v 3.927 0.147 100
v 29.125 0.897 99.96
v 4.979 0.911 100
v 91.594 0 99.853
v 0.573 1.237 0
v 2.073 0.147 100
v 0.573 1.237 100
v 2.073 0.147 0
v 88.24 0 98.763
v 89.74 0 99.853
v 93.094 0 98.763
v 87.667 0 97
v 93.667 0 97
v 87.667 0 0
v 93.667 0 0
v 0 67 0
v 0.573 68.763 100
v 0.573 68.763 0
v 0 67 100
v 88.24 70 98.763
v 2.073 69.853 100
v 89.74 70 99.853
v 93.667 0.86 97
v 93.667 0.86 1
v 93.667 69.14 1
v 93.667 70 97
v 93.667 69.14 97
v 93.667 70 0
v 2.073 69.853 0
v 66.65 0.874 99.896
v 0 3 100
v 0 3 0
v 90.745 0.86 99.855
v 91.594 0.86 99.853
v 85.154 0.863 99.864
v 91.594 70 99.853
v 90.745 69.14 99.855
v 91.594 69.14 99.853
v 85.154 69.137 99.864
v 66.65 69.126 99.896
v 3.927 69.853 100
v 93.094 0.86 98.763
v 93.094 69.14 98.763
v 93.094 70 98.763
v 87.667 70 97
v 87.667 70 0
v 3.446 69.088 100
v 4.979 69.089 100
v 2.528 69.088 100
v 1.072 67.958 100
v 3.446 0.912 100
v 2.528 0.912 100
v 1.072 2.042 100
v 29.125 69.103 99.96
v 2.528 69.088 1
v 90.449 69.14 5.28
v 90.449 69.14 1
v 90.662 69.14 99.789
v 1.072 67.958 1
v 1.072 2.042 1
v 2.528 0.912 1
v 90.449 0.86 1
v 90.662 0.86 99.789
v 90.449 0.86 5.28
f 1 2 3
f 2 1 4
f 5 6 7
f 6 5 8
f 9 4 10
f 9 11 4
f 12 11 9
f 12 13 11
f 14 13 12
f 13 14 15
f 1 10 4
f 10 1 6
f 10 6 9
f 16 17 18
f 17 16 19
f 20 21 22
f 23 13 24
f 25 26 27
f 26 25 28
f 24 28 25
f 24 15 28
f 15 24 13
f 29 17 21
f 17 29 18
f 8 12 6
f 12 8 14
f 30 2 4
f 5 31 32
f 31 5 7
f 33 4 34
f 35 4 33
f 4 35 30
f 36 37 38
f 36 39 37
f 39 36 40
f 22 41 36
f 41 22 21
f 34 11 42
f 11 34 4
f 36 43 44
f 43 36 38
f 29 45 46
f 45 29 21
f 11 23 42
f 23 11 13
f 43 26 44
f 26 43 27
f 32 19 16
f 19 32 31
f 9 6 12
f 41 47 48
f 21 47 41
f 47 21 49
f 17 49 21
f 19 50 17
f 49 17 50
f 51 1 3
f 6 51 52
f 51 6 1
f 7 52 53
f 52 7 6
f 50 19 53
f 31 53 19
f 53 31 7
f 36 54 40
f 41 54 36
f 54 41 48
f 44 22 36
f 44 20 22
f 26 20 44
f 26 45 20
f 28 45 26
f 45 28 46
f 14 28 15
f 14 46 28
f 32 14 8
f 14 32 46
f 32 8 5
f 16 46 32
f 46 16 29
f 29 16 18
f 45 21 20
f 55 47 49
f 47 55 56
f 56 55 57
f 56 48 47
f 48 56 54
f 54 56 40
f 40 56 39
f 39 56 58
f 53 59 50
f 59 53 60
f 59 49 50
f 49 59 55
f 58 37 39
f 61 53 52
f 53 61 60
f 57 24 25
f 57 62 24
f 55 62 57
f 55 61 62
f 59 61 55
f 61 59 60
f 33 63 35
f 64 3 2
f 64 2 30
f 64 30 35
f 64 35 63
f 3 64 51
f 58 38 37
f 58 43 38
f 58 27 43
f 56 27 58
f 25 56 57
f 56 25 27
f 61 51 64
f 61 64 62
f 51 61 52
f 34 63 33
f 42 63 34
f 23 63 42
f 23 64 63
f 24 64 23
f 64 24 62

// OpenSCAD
// file: ../lib/cubes.scad
include<defaults.scad>;

/**
 * Stackable cube (full, no hole).
 *
 * Args:
 *     size: [depth, width, height] vector. These are total dimensions, including the pedestal.
 *     stack_size: [depth, width, height] vector. These are dimensions of the pedestal itself.
 */
module StackableCube(size, stack_size) {
    translate([ 0, 0, stack_size[2] ]) {
        hull() {
            cube([ size[0], size[1], size[2] - stack_size[2] ]);
            translate(
                [ (size[0] - stack_size[0]) / 2, (size[1] - stack_size[1]) / 2, -(size[0] - stack_size[0]) / 1.25 ]
            ) cube(stack_size);
        }
        translate([ (size[0] - stack_size[0]) / 2, (size[1] - stack_size[1]) / 2, -stack_size[2] ]) cube(stack_size);
    }
}

/**
 * Simple full cube with rounded vertical edges.
 *
 * Args:
 *     size: [depth, width, height] vector.
 *     radius: Vertical edge radius.
 */
module RoundCube(size, radius = RADIUS) {
    depth = size[0];
    width = size[1];
    height = size[2];
    hull() {
        translate([ radius, radius, 0 ]) cylinder(height, r = radius);
        translate([ depth - radius, radius, 0 ]) cylinder(height, r = radius);
        translate([ radius, width - radius, 0 ]) cylinder(height, r = radius);
        translate([ depth - radius, width - radius, 0 ]) cylinder(height, r = radius);
    }
}

/**
 * Stackable full cube with rounded vertical edges.
 *
 * Args:
 *     size: [depth, width, height] vector. These are total dimensions, including the pedestal.
 *     stack_size: [depth, width, height] vector. These are dimensions of the pedestal itself.
 *     radius: Vertical edge outer radius.
 */
module StackableRoundCube(size, stack_size, radius = RADIUS) {
    stack_radius = radius - (size[0] - stack_size[0]) / 2;

    translate([ 0, 0, stack_size[2] ]) {
        hull() {
            RoundCube([ size[0], size[1], size[2] - stack_size[2] ], radius = radius);

            translate(
                [ (size[0] - stack_size[0]) / 2, (size[1] - stack_size[1]) / 2, -(size[0] - stack_size[0]) / 1.25 ]
            ) RoundCube(stack_size, radius = stack_radius);
        }
        translate([ (size[0] - stack_size[0]) / 2, (size[1] - stack_size[1]) / 2, -stack_size[2] ])
            RoundCube(stack_size, radius = stack_radius);
    }
}
// file: ../lib/dividers.scad
include<defaults.scad>;

/**
 * Vertical dividers.
 *
 * Args:
 *     size: [depth, width, height] vector of outer box size.
 *     dividers: [[x1, x2, ...], [y1, y2, ...]] for x, resp. y dividers.
 *     wall_width: Width of the dividers.
 */
module Dividers(size, dividers, wall_width = WALL_WIDTH) {
    depth = size[0];
    width = size[1];
    height = size[2];

    for (div = dividers[0]) {
        translate([ 0, div - wall_width / 2, 0 ]) cube([ depth, wall_width, height ]);
    }
    for (div = dividers[1]) {
        translate([ div - wall_width / 2, 0, 0 ]) cube([ wall_width, width, height ]);
    }
}

/**
 * Rounded vertical dividers.
 *
 * Args:
 *     size: [depth, width, height] vector of outer box size.
 *     dividers: [[x1, x2, ...], [y1, y2, ...]] for x, resp. y dividers.
 *     wall_width: Width of the dividers.
 *     radius: Radius of upper corners.
 */
module RoundDividers(size, dividers, wall_width = WALL_WIDTH, radius = RADIUS) {
    depth = size[0];
    width = size[1];
    height = size[2];

    intersection() {
        Dividers(size, dividers, wall_width = wall_width, radius = radius);

        hull() {
            translate([ radius, radius, height - radius ]) sphere(radius);
            translate([ radius, width - radius, height - radius ]) sphere(radius);
            translate([ depth - radius, width - radius, height - radius ]) sphere(radius);
            translate([ depth - radius, radius, height - radius ]) sphere(radius);

            translate([ radius, radius, 0 ]) cylinder(1, r = radius);
            translate([ radius, width - radius, 0 ]) cylinder(1, r = radius);
            translate([ depth - radius, width - radius, 0 ]) cylinder(1, r = radius);
            translate([ depth - radius, radius, 0 ]) cylinder(1, r = radius);
        }
    }
}
// file: ../lib/boxes.scad
include<cubes.scad>;
include<defaults.scad>;
include<dividers.scad>;

/**
 * Simple square box with open top.
 *
 * Args:
 *     size: [depth, width, height] vector.
 *     wall_width: Width of the vertical walls.
 *     bottom_height: Bottom thickness.
 */
module SquareBox(size, wall_width = WALL_WIDTH, bottom_height = BOTTOM_HEIGHT) {
    depth = size[0];
    width = size[1];
    height = size[2];
    difference() {
        cube(size);
        translate([ wall_width, wall_width, bottom_height ])
            cube([ depth - 2 * wall_width, width - 2 * wall_width, height ]);
    }
}

/**
 * Stackable square box. Bottom is narrowed to fit in another box with same dimensions (stackable or not).
 *
 * Args:
 *     size: [depth, width, height] vector. These are total dimensions, including the pedestal.
 *     wall_width: Width of the vertical walls.
 *     bottom_height: Bottom thickness.
 *     stack_height: Height of the pedestal.
 *     leeway: Empty space between bottom outer dimensions and top inner dimensions to allow some wiggle between the
 *             boxes.
 */
module StackableSquareBox(
    size, wall_width = WALL_WIDTH, bottom_height = BOTTOM_HEIGHT, stack_height = STACK_HEIGHT, leeway = STACK_LEEWAY
) {
    depth = size[0];
    width = size[1];
    height = size[2] - stack_height;

    difference() {
        StackableCube(size, [ depth - 2 * wall_width - 2 * leeway, width - 2 * wall_width - 2 * leeway, stack_height ]);
        translate([ wall_width, wall_width, bottom_height ])
            resize([ depth - 2 * wall_width, width - 2 * wall_width, 2 * size[2] ]) StackableCube(
                size, [ depth - 2 * wall_width - 2 * leeway, width - 2 * wall_width - 2 * leeway, stack_height ]
            );
    }
}

/**
 * Simple box with rounded vertical edges.
 *
 * Args:
 *     size: [depth, width, height] vector.
 *     wall_width: Width of the vertical walls.
 *     bottom_height: Bottom thickness.
 *     radius: Vertical edge radius. Must be greater than wall_width.
 */
module RoundBox(size, wall_width = WALL_WIDTH, bottom_height = BOTTOM_HEIGHT, radius = RADIUS, dividers = undef) {
    depth = size[0];
    width = size[1];
    height = size[2];
    difference() {
        RoundCube(size, radius = radius);
        translate([ wall_width, wall_width, bottom_height ])
            RoundCube([ depth - 2 * wall_width, width - 2 * wall_width, height ], radius = radius - wall_width);
    }
    if (dividers != undef) {
        intersection() {
            RoundCube(size, radius = radius);
            Dividers(size, dividers = dividers, wall_width = wall_width);
        }
    }
}

/**
 * Stackable round box. Bottom is narrowed to fit in another box with same dimensions (stackable or not).
 *
 * Args:
 *     size: [depth, width, height] vector. These are total dimensions, including the pedestal.
 *     radius: Vertical edge outer radius.
 *     wall_width: Width of the vertical walls.
 *     bottom_height: Bottom thickness.
 *     stack_height: Height of the pedestal.
 *     leeway: Empty space between bottom outer dimensions and top inner dimensions to allow some wiggle between the
 *             boxes.
 */
module StackableRoundBox(
    size, radius = RADIUS, wall_width = WALL_WIDTH, bottom_height = BOTTOM_HEIGHT, stack_height = STACK_HEIGHT,
    leeway = STACK_LEEWAY
) {
    depth = size[0];
    width = size[1];
    height = size[2] - stack_height;

    difference() {
        StackableRoundCube(
            size, [ depth - 2 * wall_width - 2 * leeway, width - 2 * wall_width - 2 * leeway, stack_height ],
            radius = radius
        );
        translate([ wall_width, wall_width, bottom_height ])
            resize([ depth - 2 * wall_width, width - 2 * wall_width, 2 * size[2] ])

                StackableRoundCube(
                    size, [ depth - 2 * wall_width - 2 * leeway, width - 2 * wall_width - 2 * leeway, stack_height ],
                    radius = radius - wall_width
                );
    }
}

/**
 * Round spacer. Just perimeters, no top, no bottom.
 *
 * Args:
 *     size: [depth, width, height] vector.
 *     radius: Vertical edge outer radius.
 *     wall_width: Width of the vertical walls.
 */
module RoundSpacer(size, radius = RADIUS, wall_width = WALL_WIDTH) {
    depth = size[0];
    width = size[1];
    height = size[2];
    difference() {
        RoundCube(size, radius = radius);
        translate([ wall_width, wall_width, -1 ])
            RoundCube([ depth - 2 * wall_width, width - 2 * wall_width, height + 2 ], radius = radius);
    }
}
// file: ../lib/defaults.scad
WALL_WIDTH = 0.86;
BOTTOM_HEIGHT = 1.0;
STACK_HEIGHT = 2.5;
STACK_LEEWAY = 0.2;
RADIUS = 3.0;
// file: ../lib/cardboxes.scad
include<boxes.scad>;
include<defaults.scad>;
include<dividers.scad>;

/**
 * Simple card box with rounded vertical edges.
 *
 * Args:
 *     size: [depth, width, height] vector.
 *     wall_width: Width of the vertical walls (except for one).
 *     bottom_height: Bottom thickness.
 *     radius: Vertical edge radius. Must be greater than wall_width.
 */
module RoundCardBox(size, dividers = undef, wall_width = WALL_WIDTH, bottom_height = BOTTOM_HEIGHT, radius = RADIUS) {
    module RoundCardBoxOuter(size, radius) {
        depth = size[0];
        width = size[1];
        height = size[2];
        hull() {
            translate([ radius, radius, 0 ]) cylinder(height, r = radius);
            translate([ radius, depth - radius, 0 ]) cylinder(height, r = radius);
            translate([ width - radius, 0, height - radius ]) rotate([ -90, 0, 0 ]) cylinder(depth, r = radius);
            translate([ width - 2 * radius, 0, 0 ]) cube([ 2 * radius, depth, 2 * radius ]);
        }
    }
    depth = size[0];
    width = size[1];
    height = size[2];

    difference() {
        RoundCardBoxOuter([ width, depth, height ], radius = radius);
        translate([ wall_width, wall_width, bottom_height ]) resize([ depth, width - 2 * wall_width, height ])
            RoundCardBoxOuter([ width, depth, height ], radius = radius - wall_width);
    }
    // translate([ depth - 12, 0, bottom_height - 0.001 ]) cube([ 5, width, 2.5 + 0.001 ]);
    if (dividers != undef) {
        intersection() {
            RoundCardBoxOuter([ width, depth, height ], radius = radius);
            Dividers(size, dividers = dividers, wall_width = wall_width);
        }
    }
}

/**
 * Simple card box.
 *
 * Args:
 *     size: [depth, width, height] vector.
 *     wall_width: Width of the vertical walls (except for one).
 *     bottom_height: Bottom thickness.
 */
module CardBox(size, dividers = undef, wall_width = WALL_WIDTH, bottom_height = BOTTOM_HEIGHT) {
    depth = size[0];
    width = size[1];
    height = size[2];

    difference() {
        cube([ depth, width, height ]);
        translate([ wall_width, wall_width, bottom_height ]) resize([ depth, width - 2 * wall_width, height ])
            cube([ depth, width, height ]);
    }
    translate([ depth - 12, 0, bottom_height - 0.001 ]) cube([ 5, width, 2.5 + 0.001 ]);
    if (dividers != undef) {
        intersection() {
            cube([ depth, width, height ]);
            Dividers(size, dividers = dividers, wall_width = wall_width);
        }
    }
}
// main file
// clang-format off
include<../lib/cardboxes.scad>;
include<../lib/defaults.scad>;
// clang-format on

module BoxShape1() {
    intersection() {
        translate([ 0, -45 ]) import("board1.svg");
        square([ 200, 200 ]);
    }
}

module BoxShape2() {
    intersection() {
        translate([ 0, -45 ]) import("board1.svg");
        translate([ 0, -200 ]) square([ 200, 200 ]);
    }
}

module Box1() {
    linear_extrude(height = BOTTOM_HEIGHT) BoxShape1();
    linear_extrude(height = 13) difference() {
        BoxShape1();
        offset(delta = -WALL_WIDTH) BoxShape1();
    }
}

module Box2() {
    linear_extrude(height = BOTTOM_HEIGHT) BoxShape2();
    linear_extrude(height = 13) difference() {
        BoxShape2();
        offset(r = -WALL_WIDTH) BoxShape2();
    }
}

module Box3() { import("board2.svg"); }

module CardBox1() {
    RoundCardBox([ 281 / 3, 70, 100 ]); // fix height!
}

CardBox1();
